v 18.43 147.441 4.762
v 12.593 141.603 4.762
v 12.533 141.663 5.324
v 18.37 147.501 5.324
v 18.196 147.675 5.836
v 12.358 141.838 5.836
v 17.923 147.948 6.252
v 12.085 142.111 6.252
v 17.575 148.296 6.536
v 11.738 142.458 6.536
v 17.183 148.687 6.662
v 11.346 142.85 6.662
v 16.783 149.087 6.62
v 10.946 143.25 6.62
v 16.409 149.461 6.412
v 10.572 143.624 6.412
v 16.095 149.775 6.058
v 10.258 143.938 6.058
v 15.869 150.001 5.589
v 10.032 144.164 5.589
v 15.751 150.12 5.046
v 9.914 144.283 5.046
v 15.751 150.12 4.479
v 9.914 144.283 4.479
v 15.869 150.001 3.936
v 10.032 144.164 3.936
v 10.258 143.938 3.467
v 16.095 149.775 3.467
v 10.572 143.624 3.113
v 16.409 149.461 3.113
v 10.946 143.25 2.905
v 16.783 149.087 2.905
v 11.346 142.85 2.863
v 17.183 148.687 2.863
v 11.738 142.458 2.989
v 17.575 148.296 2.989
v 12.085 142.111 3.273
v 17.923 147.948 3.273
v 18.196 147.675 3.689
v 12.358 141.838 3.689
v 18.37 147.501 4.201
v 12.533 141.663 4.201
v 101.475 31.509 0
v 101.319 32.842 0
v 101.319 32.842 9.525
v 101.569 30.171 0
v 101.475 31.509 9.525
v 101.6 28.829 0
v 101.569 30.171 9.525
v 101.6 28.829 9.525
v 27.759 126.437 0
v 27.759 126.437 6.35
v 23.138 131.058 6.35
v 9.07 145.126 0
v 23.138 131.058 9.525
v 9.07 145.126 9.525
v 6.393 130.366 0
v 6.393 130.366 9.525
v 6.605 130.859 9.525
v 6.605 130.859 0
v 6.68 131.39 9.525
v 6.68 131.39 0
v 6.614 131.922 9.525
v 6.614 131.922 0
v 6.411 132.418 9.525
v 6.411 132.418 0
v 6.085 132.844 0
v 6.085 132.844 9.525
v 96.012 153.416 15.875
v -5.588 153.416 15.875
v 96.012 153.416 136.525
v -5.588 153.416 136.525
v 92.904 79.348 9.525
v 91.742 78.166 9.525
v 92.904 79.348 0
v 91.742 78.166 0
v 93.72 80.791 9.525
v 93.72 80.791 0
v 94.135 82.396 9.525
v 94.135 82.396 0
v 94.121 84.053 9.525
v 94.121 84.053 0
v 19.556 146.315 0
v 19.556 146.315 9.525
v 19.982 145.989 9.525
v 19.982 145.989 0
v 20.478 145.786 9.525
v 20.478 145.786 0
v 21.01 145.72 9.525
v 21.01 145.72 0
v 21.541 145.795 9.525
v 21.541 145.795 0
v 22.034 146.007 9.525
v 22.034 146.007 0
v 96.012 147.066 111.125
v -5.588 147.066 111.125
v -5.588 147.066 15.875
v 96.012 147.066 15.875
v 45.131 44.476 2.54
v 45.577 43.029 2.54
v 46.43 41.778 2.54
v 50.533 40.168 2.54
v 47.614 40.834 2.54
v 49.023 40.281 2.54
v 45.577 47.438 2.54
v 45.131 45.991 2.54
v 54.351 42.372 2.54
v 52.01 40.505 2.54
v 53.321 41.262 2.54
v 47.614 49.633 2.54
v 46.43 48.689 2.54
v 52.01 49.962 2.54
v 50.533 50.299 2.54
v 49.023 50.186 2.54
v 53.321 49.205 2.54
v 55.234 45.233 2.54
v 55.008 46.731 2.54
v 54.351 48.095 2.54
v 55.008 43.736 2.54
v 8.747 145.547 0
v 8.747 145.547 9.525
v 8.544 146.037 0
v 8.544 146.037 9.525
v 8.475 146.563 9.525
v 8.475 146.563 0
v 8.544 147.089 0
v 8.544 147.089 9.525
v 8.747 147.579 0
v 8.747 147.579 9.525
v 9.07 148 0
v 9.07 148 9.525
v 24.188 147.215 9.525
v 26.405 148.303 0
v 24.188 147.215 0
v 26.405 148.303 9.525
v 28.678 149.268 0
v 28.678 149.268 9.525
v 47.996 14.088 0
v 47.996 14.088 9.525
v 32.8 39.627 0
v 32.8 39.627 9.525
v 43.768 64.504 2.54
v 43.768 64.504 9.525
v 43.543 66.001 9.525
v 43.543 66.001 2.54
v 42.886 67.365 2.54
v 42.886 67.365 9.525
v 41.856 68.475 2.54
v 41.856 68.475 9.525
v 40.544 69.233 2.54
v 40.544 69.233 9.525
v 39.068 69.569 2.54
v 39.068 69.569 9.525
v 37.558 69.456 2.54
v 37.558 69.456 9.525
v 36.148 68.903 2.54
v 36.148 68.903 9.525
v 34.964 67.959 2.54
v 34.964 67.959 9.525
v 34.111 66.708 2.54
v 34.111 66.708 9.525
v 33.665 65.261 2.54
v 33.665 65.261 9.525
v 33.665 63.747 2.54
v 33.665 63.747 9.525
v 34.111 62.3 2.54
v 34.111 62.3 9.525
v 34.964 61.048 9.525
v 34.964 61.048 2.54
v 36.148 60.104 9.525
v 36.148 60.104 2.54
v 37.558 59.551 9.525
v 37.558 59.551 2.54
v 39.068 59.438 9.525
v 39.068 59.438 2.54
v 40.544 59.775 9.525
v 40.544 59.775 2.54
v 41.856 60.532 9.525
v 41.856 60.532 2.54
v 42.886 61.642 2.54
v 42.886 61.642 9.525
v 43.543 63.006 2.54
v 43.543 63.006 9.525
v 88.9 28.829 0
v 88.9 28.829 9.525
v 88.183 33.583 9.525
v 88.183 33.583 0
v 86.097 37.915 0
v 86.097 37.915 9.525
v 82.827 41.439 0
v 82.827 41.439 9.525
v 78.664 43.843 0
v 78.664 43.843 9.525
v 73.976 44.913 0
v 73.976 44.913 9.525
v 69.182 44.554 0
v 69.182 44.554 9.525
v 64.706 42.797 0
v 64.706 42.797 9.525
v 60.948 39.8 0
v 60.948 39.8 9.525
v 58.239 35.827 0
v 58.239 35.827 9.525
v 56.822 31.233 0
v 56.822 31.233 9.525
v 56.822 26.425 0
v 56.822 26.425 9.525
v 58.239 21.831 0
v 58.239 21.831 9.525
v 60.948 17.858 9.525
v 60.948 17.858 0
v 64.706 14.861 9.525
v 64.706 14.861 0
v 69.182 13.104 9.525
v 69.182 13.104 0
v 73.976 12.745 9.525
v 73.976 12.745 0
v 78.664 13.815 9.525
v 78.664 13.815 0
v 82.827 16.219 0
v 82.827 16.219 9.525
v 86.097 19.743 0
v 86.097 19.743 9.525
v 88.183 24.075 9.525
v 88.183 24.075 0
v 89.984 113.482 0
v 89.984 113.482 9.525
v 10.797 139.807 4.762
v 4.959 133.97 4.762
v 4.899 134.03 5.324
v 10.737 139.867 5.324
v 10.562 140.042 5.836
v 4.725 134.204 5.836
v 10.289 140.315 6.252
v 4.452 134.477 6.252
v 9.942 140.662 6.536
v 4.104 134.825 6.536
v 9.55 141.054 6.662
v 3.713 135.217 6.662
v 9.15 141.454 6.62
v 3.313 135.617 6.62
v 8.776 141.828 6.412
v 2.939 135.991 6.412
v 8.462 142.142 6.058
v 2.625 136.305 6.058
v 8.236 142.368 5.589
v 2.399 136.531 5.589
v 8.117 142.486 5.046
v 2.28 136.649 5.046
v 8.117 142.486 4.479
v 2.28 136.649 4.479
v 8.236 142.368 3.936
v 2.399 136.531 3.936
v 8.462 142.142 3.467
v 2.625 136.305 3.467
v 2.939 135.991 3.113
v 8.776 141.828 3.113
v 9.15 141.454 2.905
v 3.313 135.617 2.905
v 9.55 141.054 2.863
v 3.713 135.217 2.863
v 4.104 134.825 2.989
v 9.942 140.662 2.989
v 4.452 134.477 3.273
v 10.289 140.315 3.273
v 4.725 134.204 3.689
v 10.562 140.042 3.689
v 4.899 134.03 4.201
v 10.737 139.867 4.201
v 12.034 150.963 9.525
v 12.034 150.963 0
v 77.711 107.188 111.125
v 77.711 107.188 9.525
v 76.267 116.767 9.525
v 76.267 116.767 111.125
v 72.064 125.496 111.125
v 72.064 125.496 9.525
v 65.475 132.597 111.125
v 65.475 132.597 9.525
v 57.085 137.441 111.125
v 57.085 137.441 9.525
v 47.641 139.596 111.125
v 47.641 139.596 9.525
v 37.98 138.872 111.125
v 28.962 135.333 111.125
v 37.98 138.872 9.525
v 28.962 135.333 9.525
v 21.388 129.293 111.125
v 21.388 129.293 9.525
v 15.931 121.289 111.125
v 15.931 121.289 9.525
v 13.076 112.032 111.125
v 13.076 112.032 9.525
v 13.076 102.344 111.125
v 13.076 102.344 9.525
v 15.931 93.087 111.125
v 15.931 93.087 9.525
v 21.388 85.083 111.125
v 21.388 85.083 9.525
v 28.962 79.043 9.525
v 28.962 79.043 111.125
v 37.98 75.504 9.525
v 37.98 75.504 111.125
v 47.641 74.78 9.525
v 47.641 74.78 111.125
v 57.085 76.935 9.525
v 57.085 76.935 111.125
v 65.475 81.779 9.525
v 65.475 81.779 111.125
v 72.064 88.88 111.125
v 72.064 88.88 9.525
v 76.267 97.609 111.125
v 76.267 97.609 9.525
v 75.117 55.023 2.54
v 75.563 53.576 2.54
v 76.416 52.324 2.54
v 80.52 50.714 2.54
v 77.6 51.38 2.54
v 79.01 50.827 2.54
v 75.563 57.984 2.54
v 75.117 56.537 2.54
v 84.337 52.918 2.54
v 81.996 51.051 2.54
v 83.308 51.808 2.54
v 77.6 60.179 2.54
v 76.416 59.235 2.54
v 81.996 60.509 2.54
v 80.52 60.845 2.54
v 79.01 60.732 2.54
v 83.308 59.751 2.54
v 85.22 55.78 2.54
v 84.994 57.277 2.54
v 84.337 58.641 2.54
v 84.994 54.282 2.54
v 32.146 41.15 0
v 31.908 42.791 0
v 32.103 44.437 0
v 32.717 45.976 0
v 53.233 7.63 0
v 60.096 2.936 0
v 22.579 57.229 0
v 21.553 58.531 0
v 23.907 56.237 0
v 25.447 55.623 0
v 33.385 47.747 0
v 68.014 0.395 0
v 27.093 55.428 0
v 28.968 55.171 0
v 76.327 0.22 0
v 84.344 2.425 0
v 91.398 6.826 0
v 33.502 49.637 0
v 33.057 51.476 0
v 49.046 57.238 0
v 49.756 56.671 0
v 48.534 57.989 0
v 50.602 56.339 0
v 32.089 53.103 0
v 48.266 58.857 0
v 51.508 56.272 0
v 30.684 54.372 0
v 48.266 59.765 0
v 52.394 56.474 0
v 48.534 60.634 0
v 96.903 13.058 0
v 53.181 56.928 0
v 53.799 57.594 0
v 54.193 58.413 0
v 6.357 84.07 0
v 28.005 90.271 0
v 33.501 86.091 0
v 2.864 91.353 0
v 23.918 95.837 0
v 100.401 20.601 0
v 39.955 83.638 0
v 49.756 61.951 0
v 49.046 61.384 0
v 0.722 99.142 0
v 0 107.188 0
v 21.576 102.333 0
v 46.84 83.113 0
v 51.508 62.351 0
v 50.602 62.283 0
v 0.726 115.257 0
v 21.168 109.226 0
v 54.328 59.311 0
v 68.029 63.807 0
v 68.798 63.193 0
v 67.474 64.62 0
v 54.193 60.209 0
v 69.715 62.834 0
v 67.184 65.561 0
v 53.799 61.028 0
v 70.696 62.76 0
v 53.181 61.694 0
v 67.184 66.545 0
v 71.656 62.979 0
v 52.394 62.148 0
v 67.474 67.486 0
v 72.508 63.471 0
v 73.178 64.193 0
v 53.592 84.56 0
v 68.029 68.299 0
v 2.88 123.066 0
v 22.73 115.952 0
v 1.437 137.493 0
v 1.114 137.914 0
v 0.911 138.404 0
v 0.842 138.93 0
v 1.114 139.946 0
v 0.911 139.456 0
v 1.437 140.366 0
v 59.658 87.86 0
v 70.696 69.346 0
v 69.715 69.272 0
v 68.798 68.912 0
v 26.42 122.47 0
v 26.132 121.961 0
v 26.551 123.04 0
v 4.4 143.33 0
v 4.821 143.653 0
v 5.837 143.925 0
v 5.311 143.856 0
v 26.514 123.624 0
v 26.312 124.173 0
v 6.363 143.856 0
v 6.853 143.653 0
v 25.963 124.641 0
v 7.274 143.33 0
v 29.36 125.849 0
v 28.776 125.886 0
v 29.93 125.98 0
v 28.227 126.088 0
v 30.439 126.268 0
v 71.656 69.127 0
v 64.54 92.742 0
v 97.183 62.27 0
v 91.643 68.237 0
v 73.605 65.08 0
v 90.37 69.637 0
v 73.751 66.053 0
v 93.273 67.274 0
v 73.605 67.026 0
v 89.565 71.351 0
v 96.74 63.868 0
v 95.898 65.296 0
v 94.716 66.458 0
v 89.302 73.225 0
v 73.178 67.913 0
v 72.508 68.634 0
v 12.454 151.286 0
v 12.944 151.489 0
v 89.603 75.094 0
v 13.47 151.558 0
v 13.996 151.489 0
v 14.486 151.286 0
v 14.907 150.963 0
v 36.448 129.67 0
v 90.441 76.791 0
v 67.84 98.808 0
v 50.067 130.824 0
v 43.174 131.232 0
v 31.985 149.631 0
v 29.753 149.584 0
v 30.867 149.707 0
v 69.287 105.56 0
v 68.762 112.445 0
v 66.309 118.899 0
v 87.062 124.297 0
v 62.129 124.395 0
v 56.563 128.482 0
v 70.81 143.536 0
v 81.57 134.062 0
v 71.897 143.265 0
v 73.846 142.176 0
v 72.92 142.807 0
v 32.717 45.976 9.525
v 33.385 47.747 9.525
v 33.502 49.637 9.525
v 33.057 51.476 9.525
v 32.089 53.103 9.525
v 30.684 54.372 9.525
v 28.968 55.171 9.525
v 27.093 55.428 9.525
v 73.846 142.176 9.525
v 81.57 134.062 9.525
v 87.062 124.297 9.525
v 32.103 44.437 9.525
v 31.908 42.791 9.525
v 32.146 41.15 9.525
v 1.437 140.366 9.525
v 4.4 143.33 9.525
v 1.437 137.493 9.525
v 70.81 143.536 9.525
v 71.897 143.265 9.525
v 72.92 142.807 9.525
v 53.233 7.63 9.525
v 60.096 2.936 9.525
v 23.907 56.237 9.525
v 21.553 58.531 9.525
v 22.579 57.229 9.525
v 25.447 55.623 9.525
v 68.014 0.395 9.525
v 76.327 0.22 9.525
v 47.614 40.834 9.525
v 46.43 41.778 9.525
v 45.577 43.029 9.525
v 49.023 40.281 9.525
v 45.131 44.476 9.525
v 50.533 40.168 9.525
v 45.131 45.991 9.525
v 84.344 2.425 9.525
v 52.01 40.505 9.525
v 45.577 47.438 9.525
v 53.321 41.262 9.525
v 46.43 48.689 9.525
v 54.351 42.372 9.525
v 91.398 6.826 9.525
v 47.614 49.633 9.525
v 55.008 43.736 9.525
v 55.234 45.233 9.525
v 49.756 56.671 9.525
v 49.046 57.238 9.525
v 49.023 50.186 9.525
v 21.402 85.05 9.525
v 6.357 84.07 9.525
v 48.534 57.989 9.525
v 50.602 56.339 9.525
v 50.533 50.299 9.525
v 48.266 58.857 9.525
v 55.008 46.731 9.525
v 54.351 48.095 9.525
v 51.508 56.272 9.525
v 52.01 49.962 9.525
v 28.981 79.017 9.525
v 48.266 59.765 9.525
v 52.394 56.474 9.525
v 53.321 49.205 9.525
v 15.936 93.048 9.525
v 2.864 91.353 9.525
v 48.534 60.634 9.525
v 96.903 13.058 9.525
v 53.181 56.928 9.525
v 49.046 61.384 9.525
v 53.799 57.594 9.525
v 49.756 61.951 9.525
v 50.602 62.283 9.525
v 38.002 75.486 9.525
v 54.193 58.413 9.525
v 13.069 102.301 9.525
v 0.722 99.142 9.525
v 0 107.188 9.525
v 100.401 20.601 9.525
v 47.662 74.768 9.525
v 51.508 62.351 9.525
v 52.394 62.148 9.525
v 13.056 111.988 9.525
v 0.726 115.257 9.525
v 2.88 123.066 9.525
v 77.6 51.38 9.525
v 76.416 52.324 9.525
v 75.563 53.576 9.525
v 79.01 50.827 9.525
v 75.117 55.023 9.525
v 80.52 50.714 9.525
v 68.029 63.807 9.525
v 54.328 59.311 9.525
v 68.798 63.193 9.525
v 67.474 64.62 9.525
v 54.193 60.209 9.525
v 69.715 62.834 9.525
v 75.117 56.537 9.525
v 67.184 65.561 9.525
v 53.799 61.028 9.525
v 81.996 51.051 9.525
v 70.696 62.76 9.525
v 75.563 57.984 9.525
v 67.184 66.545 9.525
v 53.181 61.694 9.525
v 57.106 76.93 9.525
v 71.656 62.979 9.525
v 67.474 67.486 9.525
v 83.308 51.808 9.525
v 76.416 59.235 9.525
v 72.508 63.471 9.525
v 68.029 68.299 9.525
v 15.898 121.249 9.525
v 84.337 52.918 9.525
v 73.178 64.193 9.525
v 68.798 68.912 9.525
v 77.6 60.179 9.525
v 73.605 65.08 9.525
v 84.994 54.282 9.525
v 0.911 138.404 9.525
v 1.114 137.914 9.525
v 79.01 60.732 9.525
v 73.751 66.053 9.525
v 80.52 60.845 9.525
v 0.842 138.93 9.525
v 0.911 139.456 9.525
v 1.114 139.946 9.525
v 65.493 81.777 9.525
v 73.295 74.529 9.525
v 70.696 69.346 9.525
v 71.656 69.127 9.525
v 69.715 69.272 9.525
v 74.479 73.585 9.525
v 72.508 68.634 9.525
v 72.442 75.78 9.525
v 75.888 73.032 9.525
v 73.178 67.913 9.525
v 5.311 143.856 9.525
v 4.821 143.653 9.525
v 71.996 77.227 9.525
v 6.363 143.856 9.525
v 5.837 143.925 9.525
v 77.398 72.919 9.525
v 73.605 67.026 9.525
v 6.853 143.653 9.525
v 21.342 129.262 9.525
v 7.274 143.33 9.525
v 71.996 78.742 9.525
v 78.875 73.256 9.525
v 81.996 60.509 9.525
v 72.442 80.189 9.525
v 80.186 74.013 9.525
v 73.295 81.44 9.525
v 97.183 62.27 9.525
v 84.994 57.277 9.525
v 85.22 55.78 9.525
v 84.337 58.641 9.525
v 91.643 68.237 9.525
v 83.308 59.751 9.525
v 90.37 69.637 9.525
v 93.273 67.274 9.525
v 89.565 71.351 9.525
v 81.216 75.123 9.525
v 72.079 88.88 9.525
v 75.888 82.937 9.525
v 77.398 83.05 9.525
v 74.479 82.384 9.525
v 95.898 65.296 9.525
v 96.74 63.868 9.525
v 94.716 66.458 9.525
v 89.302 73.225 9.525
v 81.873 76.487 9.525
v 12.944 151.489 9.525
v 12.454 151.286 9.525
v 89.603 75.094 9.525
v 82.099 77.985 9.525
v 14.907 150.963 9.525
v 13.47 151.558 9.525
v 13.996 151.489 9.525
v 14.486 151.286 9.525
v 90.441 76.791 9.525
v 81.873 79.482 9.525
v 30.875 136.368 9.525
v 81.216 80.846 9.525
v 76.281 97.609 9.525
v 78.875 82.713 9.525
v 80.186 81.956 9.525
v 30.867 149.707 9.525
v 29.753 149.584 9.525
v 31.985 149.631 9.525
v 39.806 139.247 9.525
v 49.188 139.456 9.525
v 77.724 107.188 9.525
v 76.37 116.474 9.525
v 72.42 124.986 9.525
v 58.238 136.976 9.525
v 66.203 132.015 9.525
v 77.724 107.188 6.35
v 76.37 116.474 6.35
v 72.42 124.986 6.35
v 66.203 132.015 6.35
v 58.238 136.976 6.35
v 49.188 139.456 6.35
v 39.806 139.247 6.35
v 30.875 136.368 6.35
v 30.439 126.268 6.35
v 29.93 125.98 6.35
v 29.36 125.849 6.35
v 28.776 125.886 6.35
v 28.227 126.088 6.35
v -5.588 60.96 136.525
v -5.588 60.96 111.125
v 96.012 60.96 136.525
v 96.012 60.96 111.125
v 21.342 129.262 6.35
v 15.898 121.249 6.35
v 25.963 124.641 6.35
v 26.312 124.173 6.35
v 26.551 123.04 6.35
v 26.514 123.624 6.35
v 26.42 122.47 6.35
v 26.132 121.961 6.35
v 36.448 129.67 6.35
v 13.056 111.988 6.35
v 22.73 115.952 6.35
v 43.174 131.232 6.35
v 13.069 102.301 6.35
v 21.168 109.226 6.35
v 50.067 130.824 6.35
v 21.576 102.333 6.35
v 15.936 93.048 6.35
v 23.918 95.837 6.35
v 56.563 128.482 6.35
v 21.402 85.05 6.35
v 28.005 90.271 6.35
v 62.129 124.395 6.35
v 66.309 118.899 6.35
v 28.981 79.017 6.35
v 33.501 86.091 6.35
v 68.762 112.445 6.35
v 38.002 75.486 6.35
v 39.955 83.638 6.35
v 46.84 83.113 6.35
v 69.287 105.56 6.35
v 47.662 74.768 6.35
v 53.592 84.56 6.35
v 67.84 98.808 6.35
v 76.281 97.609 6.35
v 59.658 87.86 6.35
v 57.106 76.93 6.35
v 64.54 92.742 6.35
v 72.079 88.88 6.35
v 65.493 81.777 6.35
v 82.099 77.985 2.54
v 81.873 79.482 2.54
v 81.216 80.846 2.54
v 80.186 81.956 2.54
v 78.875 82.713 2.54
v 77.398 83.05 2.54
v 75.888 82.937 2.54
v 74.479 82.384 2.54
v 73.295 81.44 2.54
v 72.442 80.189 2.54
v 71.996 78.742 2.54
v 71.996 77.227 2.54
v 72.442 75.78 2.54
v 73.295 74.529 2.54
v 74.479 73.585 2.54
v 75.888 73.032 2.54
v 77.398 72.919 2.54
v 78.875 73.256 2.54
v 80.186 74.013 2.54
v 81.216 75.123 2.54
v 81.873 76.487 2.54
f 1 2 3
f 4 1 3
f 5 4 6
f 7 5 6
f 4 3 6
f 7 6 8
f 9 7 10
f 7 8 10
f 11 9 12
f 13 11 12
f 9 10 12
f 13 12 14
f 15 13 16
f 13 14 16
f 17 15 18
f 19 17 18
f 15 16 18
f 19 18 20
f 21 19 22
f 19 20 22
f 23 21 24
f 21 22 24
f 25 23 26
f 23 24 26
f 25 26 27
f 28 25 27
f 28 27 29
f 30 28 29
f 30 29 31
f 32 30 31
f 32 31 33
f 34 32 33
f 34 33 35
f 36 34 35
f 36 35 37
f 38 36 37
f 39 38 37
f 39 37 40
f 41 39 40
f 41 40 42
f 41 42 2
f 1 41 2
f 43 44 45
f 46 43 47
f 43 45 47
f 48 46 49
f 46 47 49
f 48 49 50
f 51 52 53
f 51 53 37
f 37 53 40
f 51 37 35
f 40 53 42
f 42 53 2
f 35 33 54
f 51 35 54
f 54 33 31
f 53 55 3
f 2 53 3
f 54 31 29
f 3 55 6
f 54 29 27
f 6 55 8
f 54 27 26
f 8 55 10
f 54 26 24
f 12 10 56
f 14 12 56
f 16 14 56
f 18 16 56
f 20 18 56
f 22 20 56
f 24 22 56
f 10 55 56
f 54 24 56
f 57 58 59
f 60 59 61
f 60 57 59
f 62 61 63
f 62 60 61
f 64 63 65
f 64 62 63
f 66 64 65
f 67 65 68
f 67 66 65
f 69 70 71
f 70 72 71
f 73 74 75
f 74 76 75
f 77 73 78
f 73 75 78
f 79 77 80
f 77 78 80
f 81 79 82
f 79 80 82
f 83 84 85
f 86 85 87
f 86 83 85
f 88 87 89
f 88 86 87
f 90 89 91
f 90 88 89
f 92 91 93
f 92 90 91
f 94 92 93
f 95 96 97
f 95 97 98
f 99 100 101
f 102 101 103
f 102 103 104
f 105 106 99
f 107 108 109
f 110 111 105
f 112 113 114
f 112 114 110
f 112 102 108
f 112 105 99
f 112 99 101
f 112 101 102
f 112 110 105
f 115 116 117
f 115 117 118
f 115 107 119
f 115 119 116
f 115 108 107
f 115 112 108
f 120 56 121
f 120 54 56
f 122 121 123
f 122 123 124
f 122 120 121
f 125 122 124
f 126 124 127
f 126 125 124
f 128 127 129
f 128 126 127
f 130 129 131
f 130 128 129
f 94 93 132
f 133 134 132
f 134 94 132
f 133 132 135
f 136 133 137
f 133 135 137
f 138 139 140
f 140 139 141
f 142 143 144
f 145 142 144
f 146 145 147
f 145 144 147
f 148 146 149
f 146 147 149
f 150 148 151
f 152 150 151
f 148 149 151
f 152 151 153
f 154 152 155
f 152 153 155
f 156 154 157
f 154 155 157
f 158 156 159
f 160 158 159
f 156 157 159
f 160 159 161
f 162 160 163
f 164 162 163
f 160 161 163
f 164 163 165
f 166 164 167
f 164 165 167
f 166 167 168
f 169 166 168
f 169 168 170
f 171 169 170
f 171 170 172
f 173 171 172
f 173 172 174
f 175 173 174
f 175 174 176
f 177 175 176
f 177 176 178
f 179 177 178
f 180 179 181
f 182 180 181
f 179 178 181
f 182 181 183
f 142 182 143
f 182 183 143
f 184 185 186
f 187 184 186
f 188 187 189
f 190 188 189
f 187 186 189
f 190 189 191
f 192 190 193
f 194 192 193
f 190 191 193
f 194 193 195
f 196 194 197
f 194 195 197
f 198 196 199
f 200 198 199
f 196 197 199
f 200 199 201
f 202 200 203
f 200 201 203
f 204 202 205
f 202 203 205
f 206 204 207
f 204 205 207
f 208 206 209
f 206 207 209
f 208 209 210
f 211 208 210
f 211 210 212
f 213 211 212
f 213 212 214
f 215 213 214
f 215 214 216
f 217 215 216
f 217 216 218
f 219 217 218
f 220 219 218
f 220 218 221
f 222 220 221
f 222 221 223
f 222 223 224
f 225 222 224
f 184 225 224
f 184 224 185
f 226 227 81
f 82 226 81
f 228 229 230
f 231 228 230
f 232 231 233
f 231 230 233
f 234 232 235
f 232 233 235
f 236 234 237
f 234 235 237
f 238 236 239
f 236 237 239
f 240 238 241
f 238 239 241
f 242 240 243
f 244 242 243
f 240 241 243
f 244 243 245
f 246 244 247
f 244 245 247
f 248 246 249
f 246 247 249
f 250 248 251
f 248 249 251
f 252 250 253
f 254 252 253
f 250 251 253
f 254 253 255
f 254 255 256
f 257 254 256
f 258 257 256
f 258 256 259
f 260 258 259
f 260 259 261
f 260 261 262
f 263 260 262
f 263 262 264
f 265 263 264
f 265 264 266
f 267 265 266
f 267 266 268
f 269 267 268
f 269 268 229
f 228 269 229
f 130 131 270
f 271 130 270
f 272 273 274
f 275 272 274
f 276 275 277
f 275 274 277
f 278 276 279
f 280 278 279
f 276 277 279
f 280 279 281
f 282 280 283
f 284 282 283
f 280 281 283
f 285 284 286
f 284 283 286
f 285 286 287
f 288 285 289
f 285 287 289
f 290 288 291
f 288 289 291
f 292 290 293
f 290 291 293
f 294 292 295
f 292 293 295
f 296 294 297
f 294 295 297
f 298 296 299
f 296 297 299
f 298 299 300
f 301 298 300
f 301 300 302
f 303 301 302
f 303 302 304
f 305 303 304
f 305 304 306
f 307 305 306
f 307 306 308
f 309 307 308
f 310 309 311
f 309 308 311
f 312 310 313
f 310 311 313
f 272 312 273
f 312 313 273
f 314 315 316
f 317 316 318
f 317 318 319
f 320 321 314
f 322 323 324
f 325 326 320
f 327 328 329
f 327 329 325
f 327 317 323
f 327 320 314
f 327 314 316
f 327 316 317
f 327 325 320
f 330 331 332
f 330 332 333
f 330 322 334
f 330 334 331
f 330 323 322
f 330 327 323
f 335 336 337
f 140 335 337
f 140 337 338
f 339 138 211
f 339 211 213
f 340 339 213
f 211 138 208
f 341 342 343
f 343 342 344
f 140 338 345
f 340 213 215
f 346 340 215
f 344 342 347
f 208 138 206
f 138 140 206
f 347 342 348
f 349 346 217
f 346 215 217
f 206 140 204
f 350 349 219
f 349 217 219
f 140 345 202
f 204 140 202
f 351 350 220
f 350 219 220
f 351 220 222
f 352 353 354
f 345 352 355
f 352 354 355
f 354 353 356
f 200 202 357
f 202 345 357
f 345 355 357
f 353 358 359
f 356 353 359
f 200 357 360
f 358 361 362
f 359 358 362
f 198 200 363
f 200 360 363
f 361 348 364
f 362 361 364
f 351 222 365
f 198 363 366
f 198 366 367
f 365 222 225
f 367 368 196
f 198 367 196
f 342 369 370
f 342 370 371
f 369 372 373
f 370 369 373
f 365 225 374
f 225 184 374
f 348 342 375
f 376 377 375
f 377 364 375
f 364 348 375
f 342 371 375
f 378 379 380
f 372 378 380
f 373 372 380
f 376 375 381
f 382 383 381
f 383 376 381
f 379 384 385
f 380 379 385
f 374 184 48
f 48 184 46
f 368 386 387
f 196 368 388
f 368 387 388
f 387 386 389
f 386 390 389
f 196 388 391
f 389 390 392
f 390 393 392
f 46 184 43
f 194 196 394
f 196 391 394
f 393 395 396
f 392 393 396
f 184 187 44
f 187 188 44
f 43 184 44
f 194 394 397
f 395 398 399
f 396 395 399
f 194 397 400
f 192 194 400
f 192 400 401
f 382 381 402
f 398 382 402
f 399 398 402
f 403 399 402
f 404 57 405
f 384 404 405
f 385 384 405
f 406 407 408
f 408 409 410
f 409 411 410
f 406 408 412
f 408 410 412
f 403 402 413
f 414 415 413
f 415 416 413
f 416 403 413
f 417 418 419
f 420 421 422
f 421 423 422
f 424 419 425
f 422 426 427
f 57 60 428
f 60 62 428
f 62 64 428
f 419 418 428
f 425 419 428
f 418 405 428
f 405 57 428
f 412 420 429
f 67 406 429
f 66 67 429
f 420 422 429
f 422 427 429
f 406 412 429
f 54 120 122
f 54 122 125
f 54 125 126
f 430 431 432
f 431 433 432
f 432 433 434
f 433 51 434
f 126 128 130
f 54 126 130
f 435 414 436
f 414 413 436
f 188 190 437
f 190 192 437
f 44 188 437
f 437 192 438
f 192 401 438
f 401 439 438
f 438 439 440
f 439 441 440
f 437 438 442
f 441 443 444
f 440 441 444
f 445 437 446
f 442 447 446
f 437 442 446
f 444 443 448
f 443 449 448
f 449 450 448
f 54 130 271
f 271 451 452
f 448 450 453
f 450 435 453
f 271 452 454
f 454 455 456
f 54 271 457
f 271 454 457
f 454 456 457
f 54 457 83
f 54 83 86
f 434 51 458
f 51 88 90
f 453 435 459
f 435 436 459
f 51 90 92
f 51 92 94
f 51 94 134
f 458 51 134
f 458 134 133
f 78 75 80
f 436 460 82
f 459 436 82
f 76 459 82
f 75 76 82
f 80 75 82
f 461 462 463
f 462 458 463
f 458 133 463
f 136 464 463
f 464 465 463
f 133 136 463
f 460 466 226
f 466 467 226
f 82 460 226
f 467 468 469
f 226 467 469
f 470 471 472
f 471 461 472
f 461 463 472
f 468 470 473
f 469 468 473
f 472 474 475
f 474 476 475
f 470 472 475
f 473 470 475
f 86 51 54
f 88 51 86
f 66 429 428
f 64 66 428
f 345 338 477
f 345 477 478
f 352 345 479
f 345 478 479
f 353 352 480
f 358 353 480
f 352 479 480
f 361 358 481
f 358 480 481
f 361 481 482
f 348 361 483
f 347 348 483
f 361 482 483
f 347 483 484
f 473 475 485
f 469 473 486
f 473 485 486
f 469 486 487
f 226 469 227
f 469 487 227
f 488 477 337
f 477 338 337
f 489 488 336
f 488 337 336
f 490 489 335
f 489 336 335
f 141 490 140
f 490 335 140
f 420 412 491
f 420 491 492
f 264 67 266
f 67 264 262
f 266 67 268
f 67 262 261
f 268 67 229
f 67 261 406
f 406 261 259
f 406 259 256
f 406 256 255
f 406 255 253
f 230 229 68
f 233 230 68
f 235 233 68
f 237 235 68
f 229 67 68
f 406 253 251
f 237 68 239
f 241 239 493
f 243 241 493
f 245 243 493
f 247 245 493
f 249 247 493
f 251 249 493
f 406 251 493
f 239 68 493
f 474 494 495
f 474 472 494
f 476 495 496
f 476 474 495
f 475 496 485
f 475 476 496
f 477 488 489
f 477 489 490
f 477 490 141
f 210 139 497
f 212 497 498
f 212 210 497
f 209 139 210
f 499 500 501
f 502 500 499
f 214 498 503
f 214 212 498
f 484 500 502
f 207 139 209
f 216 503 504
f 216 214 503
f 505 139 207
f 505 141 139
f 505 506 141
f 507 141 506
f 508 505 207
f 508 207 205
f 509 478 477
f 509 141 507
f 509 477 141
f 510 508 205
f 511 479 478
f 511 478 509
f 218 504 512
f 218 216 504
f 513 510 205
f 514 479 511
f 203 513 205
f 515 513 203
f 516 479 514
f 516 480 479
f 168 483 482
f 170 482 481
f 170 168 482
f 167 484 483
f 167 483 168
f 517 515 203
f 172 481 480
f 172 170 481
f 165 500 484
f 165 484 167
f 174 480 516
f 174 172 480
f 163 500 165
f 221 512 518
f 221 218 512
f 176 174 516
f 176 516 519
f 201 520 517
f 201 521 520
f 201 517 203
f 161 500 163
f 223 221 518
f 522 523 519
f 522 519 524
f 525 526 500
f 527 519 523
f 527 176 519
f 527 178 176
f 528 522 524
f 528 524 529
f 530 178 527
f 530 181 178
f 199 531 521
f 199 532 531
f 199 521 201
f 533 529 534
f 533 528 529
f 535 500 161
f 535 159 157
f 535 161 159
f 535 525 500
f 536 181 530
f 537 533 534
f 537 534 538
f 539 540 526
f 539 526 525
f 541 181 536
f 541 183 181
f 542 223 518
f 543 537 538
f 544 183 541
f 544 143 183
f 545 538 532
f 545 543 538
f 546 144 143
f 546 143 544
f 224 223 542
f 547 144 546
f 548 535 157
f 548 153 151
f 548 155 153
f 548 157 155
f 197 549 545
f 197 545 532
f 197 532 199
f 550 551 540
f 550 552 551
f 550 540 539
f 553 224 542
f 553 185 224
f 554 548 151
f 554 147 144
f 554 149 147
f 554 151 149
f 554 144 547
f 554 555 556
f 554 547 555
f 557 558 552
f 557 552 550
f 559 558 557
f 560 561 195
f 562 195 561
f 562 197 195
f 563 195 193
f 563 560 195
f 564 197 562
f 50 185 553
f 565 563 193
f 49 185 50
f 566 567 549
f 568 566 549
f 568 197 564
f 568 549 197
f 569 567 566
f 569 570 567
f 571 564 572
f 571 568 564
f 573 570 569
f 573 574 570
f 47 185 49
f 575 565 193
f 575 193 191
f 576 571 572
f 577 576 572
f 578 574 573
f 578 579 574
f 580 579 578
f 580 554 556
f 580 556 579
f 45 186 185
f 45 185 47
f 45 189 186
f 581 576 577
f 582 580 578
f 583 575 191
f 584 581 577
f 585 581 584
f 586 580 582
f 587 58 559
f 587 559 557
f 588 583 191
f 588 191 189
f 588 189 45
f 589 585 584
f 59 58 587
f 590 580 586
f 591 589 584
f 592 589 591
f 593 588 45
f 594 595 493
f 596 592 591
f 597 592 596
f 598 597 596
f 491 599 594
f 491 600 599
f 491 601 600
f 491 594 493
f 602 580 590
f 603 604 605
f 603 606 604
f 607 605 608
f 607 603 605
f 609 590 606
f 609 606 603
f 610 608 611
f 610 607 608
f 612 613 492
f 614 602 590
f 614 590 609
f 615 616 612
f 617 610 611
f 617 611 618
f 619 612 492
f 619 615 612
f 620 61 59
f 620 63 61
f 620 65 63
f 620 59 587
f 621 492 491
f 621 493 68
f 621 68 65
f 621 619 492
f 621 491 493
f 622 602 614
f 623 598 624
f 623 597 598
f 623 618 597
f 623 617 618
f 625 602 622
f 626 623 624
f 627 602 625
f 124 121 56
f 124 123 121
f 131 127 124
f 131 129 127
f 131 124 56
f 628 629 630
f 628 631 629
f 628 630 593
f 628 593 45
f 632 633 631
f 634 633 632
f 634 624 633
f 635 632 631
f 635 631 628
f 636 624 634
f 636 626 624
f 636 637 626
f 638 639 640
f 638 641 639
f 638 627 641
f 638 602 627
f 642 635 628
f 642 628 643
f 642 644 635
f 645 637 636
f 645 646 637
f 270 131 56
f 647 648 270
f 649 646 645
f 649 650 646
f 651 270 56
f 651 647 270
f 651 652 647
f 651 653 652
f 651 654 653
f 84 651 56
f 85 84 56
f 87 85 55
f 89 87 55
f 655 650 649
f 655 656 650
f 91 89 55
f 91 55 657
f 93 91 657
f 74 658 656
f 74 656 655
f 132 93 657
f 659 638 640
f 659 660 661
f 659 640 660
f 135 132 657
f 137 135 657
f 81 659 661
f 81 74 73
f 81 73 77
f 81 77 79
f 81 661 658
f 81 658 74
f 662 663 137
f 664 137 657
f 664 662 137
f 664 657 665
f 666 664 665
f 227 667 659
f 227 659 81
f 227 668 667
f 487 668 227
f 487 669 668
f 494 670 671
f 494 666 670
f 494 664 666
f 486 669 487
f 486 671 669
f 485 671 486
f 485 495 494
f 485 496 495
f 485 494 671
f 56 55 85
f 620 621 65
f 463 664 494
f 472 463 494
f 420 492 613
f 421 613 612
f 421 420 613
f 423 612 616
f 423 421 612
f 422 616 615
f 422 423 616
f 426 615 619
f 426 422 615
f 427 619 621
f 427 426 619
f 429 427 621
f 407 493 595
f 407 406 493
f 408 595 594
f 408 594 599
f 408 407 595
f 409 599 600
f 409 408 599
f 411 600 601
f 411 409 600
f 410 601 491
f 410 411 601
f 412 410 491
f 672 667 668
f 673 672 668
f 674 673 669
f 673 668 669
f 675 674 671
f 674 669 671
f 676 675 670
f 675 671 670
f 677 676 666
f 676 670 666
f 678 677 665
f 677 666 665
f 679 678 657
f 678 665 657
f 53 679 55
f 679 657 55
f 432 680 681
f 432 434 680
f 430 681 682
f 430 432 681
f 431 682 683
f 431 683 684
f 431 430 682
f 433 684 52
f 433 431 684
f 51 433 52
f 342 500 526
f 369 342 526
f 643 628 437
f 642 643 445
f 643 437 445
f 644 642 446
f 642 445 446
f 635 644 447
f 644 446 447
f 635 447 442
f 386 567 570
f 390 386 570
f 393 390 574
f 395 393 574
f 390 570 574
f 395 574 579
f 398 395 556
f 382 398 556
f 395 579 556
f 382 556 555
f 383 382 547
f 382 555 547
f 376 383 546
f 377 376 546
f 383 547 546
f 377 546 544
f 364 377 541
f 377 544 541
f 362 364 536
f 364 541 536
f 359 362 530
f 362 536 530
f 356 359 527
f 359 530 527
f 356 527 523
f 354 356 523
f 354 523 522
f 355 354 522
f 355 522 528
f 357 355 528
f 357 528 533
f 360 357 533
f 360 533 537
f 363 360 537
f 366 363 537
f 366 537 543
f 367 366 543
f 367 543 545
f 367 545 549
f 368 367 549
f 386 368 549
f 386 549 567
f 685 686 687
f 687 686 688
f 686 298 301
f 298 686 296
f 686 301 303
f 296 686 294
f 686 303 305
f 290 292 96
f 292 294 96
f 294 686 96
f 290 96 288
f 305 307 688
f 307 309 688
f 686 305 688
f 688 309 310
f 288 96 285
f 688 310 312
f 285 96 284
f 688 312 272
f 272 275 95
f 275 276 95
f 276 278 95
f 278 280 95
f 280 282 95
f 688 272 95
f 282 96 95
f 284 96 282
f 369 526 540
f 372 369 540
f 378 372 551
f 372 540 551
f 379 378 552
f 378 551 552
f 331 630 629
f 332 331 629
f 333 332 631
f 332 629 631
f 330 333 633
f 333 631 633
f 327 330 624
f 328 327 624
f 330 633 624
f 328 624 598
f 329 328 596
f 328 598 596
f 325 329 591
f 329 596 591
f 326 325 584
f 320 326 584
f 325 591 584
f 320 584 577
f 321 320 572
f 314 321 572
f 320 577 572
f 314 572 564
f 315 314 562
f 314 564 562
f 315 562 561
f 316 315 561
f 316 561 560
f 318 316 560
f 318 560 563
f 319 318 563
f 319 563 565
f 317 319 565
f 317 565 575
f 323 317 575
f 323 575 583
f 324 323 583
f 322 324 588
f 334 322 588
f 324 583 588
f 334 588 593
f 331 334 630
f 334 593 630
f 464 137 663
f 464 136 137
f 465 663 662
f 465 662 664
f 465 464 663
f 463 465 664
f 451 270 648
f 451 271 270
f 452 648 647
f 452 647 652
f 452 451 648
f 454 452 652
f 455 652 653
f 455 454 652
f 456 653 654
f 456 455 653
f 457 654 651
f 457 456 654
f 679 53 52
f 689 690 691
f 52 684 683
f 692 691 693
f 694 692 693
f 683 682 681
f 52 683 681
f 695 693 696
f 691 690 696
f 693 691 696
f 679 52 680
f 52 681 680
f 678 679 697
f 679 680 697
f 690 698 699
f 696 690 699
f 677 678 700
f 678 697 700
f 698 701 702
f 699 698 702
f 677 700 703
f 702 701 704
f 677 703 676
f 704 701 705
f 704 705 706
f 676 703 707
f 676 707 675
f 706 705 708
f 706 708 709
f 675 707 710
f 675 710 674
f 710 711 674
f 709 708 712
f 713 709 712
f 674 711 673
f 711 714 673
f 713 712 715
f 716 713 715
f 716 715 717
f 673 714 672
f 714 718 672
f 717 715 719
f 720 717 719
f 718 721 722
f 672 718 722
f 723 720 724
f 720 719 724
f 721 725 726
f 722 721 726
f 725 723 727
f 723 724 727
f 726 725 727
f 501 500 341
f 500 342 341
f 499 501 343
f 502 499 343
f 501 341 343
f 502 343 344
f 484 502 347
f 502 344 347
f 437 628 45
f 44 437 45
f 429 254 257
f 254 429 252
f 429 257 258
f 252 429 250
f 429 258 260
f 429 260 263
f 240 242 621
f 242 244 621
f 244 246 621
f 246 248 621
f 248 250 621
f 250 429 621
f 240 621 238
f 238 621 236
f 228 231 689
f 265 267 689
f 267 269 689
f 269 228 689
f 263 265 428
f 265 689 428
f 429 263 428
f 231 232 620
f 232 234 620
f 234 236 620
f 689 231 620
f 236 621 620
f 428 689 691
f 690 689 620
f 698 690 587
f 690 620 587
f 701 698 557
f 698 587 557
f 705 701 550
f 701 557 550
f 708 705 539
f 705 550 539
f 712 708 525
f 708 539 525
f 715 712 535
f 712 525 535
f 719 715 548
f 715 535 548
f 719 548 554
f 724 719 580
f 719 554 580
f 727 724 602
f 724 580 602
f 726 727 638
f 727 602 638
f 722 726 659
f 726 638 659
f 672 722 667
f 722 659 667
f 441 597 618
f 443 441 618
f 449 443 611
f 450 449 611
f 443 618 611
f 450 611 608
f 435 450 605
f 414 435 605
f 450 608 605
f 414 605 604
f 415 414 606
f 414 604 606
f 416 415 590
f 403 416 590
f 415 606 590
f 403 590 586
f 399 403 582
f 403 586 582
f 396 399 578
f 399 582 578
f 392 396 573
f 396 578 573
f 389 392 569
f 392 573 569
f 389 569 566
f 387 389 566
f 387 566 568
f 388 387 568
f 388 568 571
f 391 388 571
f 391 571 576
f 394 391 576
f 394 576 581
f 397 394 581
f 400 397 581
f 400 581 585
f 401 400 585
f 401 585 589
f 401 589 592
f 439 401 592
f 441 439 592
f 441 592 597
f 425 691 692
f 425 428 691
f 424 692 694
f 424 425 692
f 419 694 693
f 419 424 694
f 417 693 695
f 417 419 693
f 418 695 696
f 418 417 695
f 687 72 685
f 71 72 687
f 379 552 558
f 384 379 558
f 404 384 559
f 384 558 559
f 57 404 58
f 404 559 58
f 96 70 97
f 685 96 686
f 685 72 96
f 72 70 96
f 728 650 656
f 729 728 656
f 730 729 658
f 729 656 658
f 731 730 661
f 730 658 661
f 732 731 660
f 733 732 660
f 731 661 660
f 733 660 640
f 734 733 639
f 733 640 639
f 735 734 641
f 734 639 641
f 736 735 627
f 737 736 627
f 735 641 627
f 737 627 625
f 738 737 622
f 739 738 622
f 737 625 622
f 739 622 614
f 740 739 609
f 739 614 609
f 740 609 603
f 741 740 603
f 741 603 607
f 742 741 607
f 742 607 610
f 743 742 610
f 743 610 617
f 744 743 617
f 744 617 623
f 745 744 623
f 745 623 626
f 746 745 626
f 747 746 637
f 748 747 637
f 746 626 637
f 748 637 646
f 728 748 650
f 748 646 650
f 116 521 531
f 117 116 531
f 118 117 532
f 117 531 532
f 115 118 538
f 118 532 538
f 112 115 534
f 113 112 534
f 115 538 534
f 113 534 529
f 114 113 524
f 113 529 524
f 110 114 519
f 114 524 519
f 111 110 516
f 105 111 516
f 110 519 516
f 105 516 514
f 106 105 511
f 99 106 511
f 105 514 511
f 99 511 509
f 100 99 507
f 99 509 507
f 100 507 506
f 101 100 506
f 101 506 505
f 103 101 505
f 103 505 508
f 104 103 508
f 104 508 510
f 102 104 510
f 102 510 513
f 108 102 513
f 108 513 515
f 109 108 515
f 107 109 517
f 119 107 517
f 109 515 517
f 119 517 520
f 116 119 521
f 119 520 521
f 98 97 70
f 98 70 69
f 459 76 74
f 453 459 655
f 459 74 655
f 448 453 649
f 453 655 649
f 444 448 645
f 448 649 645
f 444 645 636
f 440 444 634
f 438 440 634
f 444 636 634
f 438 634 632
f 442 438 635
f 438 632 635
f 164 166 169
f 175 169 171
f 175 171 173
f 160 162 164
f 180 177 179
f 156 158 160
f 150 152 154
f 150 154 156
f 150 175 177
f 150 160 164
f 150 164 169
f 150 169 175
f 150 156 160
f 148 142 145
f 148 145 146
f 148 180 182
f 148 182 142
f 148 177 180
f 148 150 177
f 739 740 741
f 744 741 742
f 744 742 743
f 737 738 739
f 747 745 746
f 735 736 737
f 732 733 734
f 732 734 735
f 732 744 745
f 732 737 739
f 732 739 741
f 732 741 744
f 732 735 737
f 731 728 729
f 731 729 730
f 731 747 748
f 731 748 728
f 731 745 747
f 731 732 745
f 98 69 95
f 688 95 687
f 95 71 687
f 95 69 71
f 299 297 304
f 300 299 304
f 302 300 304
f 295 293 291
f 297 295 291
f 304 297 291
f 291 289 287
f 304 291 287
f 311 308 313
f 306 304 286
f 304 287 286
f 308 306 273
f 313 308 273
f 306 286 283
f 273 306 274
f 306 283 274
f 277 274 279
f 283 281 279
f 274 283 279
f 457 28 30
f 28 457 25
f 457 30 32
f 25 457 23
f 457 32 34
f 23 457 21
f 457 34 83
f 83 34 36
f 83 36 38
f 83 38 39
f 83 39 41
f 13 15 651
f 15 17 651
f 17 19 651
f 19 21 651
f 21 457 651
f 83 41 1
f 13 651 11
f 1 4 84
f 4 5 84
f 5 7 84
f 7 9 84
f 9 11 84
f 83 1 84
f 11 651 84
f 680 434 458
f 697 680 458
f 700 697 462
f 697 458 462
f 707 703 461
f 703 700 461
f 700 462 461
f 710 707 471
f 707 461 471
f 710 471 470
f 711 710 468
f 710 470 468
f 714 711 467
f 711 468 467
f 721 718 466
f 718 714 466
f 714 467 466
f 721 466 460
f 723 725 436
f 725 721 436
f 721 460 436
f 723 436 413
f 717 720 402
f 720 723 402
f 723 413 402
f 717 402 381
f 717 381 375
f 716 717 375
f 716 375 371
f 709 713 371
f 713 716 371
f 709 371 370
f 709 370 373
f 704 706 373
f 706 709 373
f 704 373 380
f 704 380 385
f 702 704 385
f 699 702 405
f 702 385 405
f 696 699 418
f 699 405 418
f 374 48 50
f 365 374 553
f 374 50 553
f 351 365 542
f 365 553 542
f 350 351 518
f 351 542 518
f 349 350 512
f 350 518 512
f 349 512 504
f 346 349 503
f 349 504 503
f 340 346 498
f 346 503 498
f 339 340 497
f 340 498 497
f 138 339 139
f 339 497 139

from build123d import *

# Parameters (mm, degrees)
F0_W      = 101.6
F0_H      = 152.4
F1_DEPTH  = 9.525
F2_R      = 32.512
F2_R_2    = 16.129
F3_DEPTH  = 25.4
F5_DEPTH  = 25.4
F6_R      = 33.02
F6_R_2    = 24.13
F7_DEPTH  = 6.35
F9_DEPTH  = 25.4
F10_R     = 1.905
F11_DEPTH = 25.4
F12_R     = 5.08
F13_DEPTH = 6.985
F14_R     = 3.302
F14_R_2   = 3.048
F15_DEPTH = 25.4
F16_R     = 32.4993
F17_DEPTH = 101.6
F18_W     = 101.6
F18_H     = 92.456
F19_DEPTH = 25.4
F20_W     = 101.6
F20_H     = 6.35
F21_DEPTH = 95.25
F22_R     = 6.35
F23_R     = 2.032


with BuildPart() as f1:
    # F0 (on Top) → F1 (new body)
    with BuildSketch(Plane.XY):
        with Locations((50.8, 76.2)):
            Rectangle(F0_W, F0_H)
    extrude(amount=F1_DEPTH)

    # F2 (on face) → F3 (cut)
    with BuildSketch(Plane.XY.offset(9.525)):
        with Locations((45.212, 107.188)):
            Circle(F2_R)
        with Locations((72.771, 28.829)):
            Circle(F2_R_2)
    extrude(amount=-F3_DEPTH, mode=Mode.SUBTRACT)

    # F4 (on face) → F5 (cut)
    with BuildSketch(Plane.XY.offset(9.525)):
        with BuildLine():
            Line((0, 0), (72.7710000733, 0))
            ThreePointArc((72.7710000733, 0), (58.5206703615, 3.768286798), (47.9957095185, 14.0880291175))
            Line((47.9957095185, 14.0880291175), (30.4234443558, 43.6219029237))
            ThreePointArc((30.4234443558, 43.6219029237), (32.6336469107, 52.3259252506), (23.9296245838, 54.5361278054))
            Line((23.9296245838, 54.5361278054), (6.3573594211, 84.0700016116))
            ThreePointArc((6.3573594211, 84.0700016116), (1.6183023256, 95.1999031088), (0, 107.188))
            Line((0, 107.188), (0, 0))
        make_face()
        with BuildLine():
            Line((7.2246134342, 131.7050023841), (0, 138.9296158184))
            Line((0, 138.9296158184), (0, 107.188))
            ThreePointArc((0, 107.188), (1.8437474101, 119.9676561493), (7.2246134342, 131.7050023841))
        make_face()
        Polygon((0, 138.9296158184), (13.4703841816, 152.4), (0, 152.4), align=None)
        with BuildLine():
            ThreePointArc((72.4437617696, 143.2789420066), (84.1747986467, 130.1232406923), (89.9838196578, 113.4815767678))
            Line((89.9838196578, 113.4815767678), (94.7676421119, 79.4499848615))
            ThreePointArc((94.7676421119, 79.4499848615), (89.363394515, 72.277878622), (96.5355007546, 66.8736310251))
            Line((96.5355007546, 66.8736310251), (101.3193232087, 32.8420391188))
            ThreePointArc((101.3193232087, 32.8420391188), (101.5297452052, 30.8404211947), (101.6, 28.8289998081))
            Line((101.6, 28.8289998081), (101.6, 152.4))
            Line((101.6, 152.4), (13.4703841816, 152.4))
            Line((13.4703841816, 152.4), (20.6949976159, 145.1753865658))
            ThreePointArc((20.6949976159, 145.1753865658), (25.3824997549, 147.8194639661), (30.3509720516, 149.8878219237))
            Line((30.3509720516, 149.8878219237), (72.4437617696, 143.2789420066))
        make_face()
        with BuildLine():
            Line((101.6, 0), (101.6, 28.8289998081))
            ThreePointArc((101.6, 28.8289998081), (93.1561813529, 8.4438185632), (72.7710000733, 0))
            Line((72.7710000733, 0), (101.6, 0))
        make_face()
    extrude(amount=-F5_DEPTH, mode=Mode.SUBTRACT)

    # F6 (on face) → F7 (join)
    with BuildSketch(Plane(origin=(0, 0, 0), x_dir=(1, 0, 0), z_dir=(0, 0, -1))):
        with Locations((45.212, -107.188)):
            Circle(F6_R)
        with Locations((45.212, -107.188)):
            Circle(F6_R_2, mode=Mode.SUBTRACT)
    extrude(amount=-F7_DEPTH)

    # F8 (on face) → F9 (cut)
    with BuildSketch(Plane.XY.offset(9.525)):
        Polygon((29.6315491221, 124.5645021021), (7.6332177029, 146.5628335213), (5.8371664787, 144.7667822971), (27.8354978979, 122.7684508779), align=None)
    extrude(amount=-F9_DEPTH, mode=Mode.SUBTRACT)

    # F10 (on face) → F11 (cut)
    with BuildSketch(Plane(origin=(69.4648079092, 69.4648079092, 0), x_dir=(0.7071067812, -0.7071067812, 0), z_dir=(-0.7071067812, -0.7071067812, 0))):
        with Locations((-93.129500302, 4.7625)):
            Circle(F10_R)
    extrude(amount=-F11_DEPTH, mode=Mode.SUBTRACT)

    # F12 (on face) → F13 (cut)
    with BuildSketch(Plane.XY.offset(9.525)):
        with Locations((38.6882198833, 64.5036622051)):
            Circle(F12_R)
        with Locations((77.0188242242, 77.9846040883)):
            Circle(F12_R)
        with Locations((80.1401720853, 55.7796753677)):
            Circle(F12_R)
        with Locations((50.1537692021, 45.2334040134)):
            Circle(F12_R)
    extrude(amount=-F13_DEPTH, mode=Mode.SUBTRACT)

    # F14 (on face) → F15 (cut)
    with BuildSketch(Plane.XY.offset(9.525)):
        with Locations((70.4493668127, 66.0528214254)):
            Circle(F14_R)
        with Locations((51.2803585402, 59.3110470411)):
            Circle(F14_R_2)
    extrude(amount=-F15_DEPTH, mode=Mode.SUBTRACT)

    # F22
    f22_edges = [f1.edges().sort_by_distance(p)[0] for p in [
        (94.767642, 79.449985, 4.7625),
        (96.535501, 66.873631, 4.7625),
        (23.929625, 54.536128, 4.7625),
        (30.423444, 43.621903, 4.7625),
        (72.443762, 143.278942, 4.7625),
        (30.350972, 149.887822, 4.7625),
    ]]
    fillet(f22_edges, radius=F22_R)

    # F23
    f23_edges = [f1.edges().sort_by_distance(p)[0] for p in [
        (7.633218, 146.562834, 4.7625),
        (5.837166, 144.766782, 4.7625),
        (7.224613, 131.705002, 4.7625),
        (20.694998, 145.175387, 4.7625),
        (27.275136, 123.328812, 3.175),
        (29.071188, 125.124864, 3.175),
        (0, 138.929616, 4.7625),
        (13.470384, 152.4, 4.7625),
    ]]
    fillet(f23_edges, radius=F23_R)


with BuildPart() as f17:
    # F16 (on face) → F17 (new body)
    with BuildSketch(Plane.XY.offset(9.525)):
        with Locations((45.212, 107.188)):
            Circle(F16_R)
    extrude(amount=F17_DEPTH)

    # F18 (on face) → F19 (join)
    with BuildSketch(Plane.XY.offset(111.125)):
        with Locations((45.212, 107.188)):
            Rectangle(F18_W, F18_H)
    extrude(amount=F19_DEPTH)

    # F20 (on face) → F21 (join)
    with BuildSketch(Plane(origin=(0, 0, 111.125), x_dir=(1, 0, 0), z_dir=(0, 0, -1))):
        with Locations((45.212, -150.241)):
            Rectangle(F20_W, F20_H)
    extrude(amount=F21_DEPTH)


solid = Compound([f1.part, f17.part])
